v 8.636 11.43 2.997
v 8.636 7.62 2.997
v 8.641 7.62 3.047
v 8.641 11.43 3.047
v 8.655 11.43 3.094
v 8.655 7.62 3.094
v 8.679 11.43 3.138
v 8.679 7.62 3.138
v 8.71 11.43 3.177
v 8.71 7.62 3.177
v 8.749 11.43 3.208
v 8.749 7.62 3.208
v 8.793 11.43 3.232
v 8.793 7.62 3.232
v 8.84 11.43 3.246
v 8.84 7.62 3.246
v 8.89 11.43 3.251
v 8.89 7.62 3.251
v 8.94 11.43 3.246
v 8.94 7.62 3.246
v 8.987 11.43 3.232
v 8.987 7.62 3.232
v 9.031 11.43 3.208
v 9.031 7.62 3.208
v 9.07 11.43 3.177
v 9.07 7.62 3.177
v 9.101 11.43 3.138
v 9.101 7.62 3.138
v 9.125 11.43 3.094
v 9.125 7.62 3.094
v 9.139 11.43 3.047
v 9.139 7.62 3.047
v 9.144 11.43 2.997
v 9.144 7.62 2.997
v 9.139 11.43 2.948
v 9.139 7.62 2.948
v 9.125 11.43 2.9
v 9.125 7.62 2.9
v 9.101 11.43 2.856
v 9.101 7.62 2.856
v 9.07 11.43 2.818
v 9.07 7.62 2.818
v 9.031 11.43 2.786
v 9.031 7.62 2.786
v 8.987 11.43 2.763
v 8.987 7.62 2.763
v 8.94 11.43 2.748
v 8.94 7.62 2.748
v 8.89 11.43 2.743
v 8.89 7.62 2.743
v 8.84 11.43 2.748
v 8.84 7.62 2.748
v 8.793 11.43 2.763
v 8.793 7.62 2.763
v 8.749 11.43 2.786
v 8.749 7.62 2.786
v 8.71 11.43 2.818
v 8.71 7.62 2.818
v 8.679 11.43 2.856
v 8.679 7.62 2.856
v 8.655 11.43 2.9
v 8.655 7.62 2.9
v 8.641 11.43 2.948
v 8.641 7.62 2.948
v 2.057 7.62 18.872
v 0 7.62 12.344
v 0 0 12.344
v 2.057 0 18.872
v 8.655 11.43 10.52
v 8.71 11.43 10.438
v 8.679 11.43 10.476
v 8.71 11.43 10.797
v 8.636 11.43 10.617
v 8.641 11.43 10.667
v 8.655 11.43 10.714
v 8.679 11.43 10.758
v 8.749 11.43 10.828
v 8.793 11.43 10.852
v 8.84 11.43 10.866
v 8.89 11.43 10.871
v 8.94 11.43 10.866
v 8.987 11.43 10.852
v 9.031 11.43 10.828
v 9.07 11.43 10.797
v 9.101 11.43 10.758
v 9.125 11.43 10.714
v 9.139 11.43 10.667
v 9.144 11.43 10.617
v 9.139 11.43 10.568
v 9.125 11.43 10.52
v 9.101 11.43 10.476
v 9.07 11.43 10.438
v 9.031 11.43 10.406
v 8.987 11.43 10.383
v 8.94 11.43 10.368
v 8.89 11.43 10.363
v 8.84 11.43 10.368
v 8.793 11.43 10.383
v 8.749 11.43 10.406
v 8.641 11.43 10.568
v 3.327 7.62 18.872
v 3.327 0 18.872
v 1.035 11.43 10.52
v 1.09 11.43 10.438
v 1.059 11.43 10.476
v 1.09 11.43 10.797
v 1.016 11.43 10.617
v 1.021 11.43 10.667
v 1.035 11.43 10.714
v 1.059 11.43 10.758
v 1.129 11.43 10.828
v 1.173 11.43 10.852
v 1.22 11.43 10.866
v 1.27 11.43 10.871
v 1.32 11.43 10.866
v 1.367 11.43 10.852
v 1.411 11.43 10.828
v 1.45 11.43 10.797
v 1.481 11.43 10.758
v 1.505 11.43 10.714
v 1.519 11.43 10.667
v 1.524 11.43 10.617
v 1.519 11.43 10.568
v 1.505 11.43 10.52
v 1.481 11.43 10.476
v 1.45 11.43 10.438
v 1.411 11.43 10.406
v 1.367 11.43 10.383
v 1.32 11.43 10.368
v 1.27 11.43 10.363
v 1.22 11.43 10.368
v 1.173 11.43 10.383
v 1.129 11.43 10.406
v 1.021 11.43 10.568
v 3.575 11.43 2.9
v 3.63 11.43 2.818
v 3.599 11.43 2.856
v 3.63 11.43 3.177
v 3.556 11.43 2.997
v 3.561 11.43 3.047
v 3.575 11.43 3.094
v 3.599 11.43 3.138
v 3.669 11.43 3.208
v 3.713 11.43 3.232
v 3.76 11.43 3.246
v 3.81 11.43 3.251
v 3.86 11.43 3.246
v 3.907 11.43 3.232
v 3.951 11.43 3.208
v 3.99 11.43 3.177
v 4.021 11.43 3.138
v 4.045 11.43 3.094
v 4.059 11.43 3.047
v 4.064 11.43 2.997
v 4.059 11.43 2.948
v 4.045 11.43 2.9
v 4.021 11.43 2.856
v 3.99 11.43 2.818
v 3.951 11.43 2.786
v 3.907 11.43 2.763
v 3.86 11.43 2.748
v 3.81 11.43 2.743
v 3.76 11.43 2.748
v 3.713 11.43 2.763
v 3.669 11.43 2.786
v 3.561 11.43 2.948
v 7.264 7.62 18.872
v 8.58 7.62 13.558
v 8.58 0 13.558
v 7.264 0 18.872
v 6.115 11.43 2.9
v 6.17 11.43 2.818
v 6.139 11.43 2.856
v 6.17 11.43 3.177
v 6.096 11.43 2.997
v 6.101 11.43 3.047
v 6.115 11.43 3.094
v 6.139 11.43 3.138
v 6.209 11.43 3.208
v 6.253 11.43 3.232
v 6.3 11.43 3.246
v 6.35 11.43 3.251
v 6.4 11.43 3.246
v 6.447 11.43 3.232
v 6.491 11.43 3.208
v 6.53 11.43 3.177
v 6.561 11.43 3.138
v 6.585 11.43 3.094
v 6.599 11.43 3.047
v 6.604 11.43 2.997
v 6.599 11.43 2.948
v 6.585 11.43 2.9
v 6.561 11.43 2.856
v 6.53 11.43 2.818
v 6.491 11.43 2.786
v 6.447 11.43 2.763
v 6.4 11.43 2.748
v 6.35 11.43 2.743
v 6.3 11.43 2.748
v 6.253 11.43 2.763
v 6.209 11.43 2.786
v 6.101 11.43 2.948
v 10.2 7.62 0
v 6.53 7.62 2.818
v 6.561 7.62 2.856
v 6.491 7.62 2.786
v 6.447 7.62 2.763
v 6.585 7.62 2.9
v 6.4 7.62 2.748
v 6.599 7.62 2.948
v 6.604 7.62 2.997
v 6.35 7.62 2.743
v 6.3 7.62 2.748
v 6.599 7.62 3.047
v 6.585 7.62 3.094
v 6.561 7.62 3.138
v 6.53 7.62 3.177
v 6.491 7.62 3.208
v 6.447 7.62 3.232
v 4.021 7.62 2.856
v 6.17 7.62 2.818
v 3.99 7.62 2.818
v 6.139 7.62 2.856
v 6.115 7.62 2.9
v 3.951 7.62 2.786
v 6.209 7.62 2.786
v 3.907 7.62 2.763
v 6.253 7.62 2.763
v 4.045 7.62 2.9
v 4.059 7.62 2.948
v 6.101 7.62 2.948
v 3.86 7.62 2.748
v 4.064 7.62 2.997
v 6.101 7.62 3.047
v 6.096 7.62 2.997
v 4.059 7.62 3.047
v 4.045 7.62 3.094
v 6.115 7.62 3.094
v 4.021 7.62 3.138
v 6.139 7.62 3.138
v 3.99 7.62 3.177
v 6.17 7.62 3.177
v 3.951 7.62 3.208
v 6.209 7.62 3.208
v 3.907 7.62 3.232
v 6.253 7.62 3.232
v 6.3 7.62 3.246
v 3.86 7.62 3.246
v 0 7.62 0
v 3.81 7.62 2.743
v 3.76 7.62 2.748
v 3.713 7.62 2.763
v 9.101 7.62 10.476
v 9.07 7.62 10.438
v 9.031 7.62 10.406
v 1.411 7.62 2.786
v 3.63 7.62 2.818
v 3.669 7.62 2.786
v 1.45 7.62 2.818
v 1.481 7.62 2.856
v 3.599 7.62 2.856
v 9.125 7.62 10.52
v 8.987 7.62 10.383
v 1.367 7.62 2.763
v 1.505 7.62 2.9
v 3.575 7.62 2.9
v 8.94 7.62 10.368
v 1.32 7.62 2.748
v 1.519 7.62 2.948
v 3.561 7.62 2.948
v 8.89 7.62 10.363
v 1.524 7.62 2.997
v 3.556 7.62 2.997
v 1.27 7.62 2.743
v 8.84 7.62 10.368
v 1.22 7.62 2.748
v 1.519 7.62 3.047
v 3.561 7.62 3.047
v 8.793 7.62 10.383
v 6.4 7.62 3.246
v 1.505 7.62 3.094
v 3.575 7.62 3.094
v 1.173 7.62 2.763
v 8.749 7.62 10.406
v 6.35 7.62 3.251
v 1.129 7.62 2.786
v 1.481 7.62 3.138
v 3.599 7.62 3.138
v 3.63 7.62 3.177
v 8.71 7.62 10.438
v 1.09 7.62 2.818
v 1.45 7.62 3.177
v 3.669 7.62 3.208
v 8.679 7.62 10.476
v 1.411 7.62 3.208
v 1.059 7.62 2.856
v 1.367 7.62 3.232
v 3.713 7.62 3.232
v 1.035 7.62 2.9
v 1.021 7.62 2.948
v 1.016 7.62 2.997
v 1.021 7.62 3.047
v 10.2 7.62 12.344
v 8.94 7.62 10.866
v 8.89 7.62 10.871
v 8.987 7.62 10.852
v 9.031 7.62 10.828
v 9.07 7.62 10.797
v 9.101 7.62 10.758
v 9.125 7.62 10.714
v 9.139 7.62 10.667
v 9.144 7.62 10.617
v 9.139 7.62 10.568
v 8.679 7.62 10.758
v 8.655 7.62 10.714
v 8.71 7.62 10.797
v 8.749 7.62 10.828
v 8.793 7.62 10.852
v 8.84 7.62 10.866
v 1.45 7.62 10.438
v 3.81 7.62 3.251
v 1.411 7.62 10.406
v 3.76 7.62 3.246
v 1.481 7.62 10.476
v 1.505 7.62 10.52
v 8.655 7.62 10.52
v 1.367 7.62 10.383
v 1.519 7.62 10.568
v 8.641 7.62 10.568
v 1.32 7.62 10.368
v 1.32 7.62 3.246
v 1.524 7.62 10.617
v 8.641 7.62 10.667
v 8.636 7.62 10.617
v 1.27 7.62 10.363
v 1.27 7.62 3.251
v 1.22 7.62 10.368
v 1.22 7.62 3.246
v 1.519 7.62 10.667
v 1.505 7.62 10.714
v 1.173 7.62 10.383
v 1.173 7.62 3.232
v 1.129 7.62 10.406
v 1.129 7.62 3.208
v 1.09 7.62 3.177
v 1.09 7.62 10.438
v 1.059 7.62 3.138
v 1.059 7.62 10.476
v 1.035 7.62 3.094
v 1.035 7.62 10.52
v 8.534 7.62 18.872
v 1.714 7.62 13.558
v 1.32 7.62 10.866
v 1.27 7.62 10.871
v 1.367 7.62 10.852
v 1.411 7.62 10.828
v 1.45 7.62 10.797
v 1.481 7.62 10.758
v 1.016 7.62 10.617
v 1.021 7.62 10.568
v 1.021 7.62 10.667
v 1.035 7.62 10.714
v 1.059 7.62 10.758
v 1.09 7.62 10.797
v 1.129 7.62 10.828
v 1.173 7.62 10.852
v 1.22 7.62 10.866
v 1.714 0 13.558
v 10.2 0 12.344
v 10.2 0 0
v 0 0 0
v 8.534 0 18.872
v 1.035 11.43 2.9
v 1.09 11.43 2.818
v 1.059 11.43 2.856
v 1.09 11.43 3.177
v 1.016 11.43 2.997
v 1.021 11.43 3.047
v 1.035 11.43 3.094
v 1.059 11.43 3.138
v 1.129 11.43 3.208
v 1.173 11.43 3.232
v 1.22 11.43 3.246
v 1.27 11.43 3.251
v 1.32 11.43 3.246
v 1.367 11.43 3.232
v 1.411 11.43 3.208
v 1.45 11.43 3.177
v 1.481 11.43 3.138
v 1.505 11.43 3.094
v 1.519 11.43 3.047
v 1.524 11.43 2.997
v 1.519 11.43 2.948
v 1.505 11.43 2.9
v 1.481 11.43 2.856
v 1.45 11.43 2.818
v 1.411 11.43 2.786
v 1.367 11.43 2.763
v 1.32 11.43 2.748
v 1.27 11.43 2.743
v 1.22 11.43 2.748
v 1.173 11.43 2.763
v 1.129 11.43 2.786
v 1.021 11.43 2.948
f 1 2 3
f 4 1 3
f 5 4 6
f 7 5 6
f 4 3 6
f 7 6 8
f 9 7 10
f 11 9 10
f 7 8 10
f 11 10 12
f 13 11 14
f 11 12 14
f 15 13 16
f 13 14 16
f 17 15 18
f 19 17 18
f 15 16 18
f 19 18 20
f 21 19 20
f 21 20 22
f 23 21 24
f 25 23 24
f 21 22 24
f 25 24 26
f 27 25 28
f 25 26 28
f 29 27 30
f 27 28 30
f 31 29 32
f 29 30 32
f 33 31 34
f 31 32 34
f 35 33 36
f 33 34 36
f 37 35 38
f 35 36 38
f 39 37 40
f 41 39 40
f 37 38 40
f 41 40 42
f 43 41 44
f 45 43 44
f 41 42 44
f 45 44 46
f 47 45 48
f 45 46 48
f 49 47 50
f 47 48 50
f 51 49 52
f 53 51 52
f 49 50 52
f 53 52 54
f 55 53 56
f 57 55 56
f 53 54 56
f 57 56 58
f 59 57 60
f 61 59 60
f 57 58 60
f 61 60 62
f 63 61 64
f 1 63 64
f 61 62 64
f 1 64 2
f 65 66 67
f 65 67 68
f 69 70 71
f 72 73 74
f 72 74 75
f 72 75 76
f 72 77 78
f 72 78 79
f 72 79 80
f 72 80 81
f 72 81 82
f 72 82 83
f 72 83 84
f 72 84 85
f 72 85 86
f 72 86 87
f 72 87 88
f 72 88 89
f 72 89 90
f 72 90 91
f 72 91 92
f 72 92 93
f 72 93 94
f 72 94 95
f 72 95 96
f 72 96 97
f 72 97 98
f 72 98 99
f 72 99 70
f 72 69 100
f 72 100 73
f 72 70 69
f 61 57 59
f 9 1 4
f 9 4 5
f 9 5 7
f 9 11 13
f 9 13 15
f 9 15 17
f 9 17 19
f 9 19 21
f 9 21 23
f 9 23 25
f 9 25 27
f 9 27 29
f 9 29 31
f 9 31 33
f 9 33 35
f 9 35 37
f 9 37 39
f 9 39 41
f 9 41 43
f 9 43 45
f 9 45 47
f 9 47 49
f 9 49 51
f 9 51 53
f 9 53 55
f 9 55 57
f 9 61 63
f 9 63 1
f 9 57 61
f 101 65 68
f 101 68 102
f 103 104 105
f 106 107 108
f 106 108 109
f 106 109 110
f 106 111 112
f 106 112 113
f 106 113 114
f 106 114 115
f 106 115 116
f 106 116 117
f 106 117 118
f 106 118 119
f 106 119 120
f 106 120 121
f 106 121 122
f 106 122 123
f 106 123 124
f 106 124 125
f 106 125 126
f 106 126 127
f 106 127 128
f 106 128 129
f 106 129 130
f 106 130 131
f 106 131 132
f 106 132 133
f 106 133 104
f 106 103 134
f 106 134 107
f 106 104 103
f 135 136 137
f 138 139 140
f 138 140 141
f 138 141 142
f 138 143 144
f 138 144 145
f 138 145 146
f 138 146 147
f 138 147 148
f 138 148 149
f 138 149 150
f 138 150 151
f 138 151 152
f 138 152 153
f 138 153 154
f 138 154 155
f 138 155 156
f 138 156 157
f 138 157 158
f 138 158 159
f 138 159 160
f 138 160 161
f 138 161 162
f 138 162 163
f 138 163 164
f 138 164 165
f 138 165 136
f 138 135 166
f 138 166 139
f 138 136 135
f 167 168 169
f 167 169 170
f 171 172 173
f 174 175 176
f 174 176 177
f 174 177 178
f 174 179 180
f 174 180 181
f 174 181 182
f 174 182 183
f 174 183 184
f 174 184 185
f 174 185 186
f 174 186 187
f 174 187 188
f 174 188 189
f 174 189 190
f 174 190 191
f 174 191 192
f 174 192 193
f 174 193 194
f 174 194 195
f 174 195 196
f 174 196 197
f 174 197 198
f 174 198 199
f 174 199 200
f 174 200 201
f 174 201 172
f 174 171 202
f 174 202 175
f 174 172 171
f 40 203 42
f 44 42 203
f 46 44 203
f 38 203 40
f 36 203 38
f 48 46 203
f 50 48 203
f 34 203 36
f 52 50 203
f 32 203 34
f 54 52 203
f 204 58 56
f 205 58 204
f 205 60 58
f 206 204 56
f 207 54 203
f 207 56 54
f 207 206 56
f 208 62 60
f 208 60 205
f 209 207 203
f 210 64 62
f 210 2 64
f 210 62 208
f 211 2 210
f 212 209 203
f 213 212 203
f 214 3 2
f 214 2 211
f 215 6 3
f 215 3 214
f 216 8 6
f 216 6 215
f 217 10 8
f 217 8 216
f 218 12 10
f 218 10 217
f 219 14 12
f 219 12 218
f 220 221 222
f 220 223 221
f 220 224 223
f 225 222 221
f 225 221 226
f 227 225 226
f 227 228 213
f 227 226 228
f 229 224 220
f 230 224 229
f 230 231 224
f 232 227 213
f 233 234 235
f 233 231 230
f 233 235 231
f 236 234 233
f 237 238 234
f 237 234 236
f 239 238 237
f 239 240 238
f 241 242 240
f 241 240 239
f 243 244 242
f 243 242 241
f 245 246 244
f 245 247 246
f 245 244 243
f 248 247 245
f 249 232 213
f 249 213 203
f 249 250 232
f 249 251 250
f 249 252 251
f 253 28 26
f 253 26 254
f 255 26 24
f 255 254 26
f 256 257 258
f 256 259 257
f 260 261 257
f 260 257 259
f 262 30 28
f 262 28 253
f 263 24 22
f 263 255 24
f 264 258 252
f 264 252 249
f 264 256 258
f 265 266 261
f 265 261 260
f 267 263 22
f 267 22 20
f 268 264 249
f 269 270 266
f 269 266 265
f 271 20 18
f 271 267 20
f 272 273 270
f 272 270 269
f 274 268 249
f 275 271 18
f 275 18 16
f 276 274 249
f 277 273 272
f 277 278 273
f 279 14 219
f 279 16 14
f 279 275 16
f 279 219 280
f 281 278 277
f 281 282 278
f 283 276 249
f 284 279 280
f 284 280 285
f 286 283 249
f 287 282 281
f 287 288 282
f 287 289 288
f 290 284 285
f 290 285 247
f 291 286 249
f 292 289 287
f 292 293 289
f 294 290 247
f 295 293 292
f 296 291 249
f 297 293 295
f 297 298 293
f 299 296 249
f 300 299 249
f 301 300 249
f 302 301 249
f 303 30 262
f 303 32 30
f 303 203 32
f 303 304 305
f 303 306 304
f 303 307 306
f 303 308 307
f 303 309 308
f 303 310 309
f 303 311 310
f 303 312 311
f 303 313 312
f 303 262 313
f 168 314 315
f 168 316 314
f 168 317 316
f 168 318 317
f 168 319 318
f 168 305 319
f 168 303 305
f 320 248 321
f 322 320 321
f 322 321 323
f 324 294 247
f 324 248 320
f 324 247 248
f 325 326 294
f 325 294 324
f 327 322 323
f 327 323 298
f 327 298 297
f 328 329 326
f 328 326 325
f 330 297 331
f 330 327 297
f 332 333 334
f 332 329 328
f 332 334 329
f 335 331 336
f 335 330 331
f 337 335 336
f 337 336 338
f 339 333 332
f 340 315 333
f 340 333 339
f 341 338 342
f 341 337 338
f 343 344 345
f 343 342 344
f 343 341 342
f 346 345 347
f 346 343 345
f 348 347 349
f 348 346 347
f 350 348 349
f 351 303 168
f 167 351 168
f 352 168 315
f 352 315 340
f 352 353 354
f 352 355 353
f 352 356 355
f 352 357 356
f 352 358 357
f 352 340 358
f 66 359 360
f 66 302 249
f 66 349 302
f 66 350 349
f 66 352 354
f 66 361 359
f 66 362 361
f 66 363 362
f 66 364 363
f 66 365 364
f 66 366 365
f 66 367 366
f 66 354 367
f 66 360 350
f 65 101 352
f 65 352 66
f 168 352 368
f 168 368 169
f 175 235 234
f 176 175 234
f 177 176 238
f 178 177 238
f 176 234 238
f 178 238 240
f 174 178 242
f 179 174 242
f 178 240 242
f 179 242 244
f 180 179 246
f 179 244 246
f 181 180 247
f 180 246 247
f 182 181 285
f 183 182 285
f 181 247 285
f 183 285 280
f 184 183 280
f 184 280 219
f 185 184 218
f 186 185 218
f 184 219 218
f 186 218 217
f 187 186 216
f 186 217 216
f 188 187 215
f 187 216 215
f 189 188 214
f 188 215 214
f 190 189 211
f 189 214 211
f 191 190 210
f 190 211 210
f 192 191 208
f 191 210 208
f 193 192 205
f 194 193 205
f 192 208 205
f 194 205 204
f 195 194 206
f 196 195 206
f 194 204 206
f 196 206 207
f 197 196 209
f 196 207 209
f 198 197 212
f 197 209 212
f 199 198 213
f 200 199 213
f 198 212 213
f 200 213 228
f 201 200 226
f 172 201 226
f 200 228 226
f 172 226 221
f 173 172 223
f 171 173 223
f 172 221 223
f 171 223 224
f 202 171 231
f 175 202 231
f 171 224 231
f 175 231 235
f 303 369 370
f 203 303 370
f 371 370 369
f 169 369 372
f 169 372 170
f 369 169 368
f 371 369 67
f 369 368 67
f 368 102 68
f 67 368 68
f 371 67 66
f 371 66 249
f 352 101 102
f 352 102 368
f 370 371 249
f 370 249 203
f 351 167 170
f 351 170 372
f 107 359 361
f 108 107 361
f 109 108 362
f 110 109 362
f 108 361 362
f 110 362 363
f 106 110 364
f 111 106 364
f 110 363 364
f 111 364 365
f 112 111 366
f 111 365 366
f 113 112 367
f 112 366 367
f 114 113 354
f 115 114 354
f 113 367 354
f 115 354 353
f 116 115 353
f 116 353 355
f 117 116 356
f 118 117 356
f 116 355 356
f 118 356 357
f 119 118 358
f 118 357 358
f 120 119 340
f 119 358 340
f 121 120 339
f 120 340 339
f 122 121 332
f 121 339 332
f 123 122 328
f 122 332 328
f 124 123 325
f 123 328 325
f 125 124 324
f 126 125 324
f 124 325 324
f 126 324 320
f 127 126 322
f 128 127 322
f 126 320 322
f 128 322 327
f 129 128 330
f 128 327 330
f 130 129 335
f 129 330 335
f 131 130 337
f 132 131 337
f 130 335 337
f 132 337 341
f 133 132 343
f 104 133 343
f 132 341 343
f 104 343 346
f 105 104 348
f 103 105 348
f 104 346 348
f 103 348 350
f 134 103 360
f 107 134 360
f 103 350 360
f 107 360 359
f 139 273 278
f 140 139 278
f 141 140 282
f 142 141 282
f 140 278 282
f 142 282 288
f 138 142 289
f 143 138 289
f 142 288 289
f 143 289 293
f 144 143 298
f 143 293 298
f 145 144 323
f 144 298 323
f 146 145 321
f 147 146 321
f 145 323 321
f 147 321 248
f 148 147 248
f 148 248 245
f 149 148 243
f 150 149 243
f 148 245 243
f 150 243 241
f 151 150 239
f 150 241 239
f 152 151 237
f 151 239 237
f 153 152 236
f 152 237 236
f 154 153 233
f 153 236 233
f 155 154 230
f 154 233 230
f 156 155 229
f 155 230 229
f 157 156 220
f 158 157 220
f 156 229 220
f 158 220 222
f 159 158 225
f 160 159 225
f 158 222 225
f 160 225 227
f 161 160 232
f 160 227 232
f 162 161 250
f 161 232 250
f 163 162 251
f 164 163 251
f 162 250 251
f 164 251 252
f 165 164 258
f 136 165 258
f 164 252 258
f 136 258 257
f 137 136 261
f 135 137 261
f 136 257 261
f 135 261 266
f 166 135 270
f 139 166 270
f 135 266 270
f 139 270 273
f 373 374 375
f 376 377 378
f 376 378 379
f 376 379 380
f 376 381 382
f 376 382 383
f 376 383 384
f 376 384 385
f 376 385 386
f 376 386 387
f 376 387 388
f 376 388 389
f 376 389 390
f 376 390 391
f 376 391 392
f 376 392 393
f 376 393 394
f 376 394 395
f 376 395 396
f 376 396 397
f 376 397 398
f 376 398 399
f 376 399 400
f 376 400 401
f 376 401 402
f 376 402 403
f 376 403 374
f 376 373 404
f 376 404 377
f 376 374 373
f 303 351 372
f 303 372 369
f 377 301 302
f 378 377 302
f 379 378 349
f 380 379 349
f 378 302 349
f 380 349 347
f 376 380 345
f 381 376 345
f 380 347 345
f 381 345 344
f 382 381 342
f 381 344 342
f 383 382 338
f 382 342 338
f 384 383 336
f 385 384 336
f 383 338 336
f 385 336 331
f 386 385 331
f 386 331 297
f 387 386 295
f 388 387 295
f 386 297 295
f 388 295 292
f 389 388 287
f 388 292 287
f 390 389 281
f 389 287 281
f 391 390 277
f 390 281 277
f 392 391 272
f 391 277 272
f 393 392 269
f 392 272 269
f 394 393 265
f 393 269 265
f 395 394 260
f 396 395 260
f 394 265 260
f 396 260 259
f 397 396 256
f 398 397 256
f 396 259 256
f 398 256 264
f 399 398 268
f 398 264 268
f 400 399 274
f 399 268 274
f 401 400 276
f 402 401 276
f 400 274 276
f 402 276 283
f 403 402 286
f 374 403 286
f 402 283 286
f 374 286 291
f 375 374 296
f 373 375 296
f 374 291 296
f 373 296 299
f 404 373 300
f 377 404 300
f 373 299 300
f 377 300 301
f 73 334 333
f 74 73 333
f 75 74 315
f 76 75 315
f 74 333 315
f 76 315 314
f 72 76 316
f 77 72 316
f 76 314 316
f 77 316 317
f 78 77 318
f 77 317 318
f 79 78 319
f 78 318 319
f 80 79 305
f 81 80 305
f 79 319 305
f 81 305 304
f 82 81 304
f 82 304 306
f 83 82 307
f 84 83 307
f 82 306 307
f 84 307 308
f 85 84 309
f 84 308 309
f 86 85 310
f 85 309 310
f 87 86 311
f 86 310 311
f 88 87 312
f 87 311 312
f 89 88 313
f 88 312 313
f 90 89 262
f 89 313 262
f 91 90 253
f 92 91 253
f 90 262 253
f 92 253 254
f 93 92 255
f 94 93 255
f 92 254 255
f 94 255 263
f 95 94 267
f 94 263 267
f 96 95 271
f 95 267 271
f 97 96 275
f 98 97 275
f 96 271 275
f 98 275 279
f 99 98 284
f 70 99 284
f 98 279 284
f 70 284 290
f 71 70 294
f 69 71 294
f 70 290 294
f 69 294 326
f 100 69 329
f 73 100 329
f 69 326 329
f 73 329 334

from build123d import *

# Parameters (mm, degrees)
HFBR_BASE_W          = 10.2
HFBR_BASE_H          = 12.3444
EXTRUDE1_DEPTH       = 7.62
EXTRUDE2_DEPTH       = 7.62
SKETCH3_R            = 0.254
PINS_DEPTH           = 3.81
LPATTERN1_COUNT      = 4
LPATTERN1_PITCH      = 2.54
LPATTERN1_COUNT_DIR2 = 2
LPATTERN1_PITCH_DIR2 = 7.62


with BuildPart() as part:
    # HFBR Base → Extrude1 (new body)
    with BuildSketch(Plane(origin=(0, 0, 0), x_dir=(1, 0, 0), z_dir=(0, 1, 0))):
        with Locations((5.1, -6.1722)):
            Rectangle(HFBR_BASE_W, HFBR_BASE_H)
    extrude(amount=EXTRUDE1_DEPTH)

    # Sketch2 → Extrude2 (add)
    with BuildSketch(Plane(origin=(0, 7.62, 0), x_dir=(-1, 0, 0), z_dir=(0, 1, 0))):
        Polygon((0, 12.3444), (-2.056727008, 18.8722), (-3.326727008, 18.8722), (-1.71375929, 13.55750012), (-8.579624915, 13.55750012), (-7.263727008, 18.8722), (-8.533727008, 18.8722), (-10.2, 12.3444), align=None)
    extrude(amount=-EXTRUDE2_DEPTH)

    # Sketch3 → Pins (add)
    with BuildSketch(Plane(origin=(0, 7.62, 0), x_dir=(-1, 0, 0), z_dir=(0, 1, 0))):
        with Locations((-1.27, 2.9972)):
            Circle(SKETCH3_R)
    pins = extrude(amount=PINS_DEPTH)

    # LPattern1: Pins 4 × 2, 2 skipped
    with Locations(*[(i * LPATTERN1_PITCH, 0, j * LPATTERN1_PITCH_DIR2) for i in range(LPATTERN1_COUNT) for j in range(LPATTERN1_COUNT_DIR2) if (i, j) not in ((0, 0), (1, 1), (2, 1))]):
        add(pins)


solid = part.part
